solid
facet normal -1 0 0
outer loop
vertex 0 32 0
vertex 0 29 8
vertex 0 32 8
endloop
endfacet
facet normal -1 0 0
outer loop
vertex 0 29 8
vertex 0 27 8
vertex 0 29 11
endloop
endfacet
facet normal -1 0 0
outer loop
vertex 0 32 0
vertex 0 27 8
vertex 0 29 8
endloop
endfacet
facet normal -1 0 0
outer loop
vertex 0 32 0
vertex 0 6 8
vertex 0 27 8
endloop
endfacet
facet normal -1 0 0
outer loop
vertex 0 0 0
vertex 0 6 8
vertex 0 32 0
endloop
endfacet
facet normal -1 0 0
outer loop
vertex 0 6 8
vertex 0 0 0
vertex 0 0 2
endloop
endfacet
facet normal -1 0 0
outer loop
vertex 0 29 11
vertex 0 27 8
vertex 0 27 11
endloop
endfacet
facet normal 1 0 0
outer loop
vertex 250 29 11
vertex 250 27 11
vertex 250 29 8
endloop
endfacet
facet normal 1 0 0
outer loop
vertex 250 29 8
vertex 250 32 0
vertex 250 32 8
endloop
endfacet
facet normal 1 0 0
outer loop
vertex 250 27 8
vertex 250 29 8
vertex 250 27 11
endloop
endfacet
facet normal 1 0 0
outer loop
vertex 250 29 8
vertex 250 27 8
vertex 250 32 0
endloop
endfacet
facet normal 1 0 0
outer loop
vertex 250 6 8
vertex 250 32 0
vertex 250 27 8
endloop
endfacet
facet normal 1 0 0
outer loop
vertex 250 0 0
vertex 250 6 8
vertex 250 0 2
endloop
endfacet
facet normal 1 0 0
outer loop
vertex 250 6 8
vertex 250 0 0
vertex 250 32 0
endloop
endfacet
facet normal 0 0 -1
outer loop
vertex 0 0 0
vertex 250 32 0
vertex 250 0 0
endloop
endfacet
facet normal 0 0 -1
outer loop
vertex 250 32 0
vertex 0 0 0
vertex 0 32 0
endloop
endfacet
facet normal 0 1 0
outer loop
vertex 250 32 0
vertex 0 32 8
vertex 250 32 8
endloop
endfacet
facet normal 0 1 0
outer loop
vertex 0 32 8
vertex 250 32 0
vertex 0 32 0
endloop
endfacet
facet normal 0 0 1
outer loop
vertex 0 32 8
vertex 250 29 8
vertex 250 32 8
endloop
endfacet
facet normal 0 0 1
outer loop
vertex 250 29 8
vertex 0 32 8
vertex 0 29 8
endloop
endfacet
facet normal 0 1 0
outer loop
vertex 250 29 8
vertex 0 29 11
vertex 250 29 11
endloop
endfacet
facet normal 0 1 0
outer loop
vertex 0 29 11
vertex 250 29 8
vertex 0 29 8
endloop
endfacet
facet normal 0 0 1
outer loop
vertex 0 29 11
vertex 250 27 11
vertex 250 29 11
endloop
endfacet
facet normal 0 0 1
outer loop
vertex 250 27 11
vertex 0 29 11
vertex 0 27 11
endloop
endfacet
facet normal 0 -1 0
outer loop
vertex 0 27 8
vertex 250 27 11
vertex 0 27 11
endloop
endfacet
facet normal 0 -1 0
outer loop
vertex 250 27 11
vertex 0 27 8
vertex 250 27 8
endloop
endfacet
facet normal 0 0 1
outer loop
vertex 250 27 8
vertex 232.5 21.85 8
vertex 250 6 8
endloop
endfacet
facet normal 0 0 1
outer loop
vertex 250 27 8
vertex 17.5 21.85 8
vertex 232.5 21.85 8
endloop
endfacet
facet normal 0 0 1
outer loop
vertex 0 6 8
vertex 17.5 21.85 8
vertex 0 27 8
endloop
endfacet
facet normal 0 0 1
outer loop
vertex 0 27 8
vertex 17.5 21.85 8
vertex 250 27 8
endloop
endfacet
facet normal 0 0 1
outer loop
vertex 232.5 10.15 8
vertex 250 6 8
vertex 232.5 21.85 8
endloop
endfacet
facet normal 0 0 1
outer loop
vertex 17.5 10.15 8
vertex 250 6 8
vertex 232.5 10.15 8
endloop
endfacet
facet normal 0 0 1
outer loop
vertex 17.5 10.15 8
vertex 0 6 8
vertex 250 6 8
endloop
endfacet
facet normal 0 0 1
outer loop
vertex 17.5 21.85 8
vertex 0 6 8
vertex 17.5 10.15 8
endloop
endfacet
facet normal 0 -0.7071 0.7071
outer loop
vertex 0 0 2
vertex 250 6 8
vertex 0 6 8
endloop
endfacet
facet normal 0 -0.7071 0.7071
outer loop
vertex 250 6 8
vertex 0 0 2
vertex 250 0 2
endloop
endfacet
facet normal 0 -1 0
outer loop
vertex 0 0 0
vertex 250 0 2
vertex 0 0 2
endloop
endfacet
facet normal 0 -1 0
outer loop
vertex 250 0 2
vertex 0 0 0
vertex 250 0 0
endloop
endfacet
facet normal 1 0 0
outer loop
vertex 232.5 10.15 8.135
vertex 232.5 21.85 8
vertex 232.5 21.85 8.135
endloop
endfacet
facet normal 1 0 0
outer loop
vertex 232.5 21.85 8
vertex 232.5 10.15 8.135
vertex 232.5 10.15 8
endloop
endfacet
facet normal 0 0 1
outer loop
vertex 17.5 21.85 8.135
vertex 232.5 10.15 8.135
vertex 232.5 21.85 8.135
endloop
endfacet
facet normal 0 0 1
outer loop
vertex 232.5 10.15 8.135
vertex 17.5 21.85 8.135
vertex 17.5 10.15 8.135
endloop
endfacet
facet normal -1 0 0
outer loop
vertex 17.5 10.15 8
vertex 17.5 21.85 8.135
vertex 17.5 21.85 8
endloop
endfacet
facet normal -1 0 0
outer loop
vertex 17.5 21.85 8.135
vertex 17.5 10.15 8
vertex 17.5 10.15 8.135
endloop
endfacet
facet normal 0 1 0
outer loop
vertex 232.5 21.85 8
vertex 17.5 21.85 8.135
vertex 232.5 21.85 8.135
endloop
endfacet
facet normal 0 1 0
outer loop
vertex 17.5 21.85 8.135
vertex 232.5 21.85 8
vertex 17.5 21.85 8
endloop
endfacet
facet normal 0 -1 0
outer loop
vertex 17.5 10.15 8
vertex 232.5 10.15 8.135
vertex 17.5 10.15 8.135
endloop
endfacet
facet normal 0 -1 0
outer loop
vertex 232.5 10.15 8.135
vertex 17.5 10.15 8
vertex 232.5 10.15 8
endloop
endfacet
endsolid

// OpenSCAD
// em3D Modular menu rail v1.
// Print orientation: the visible front face is the flat plane at Z=0.
// The part extends upward in +Z, leaving the PEI build-plate texture on front.
// Back lower edge uses a 45-degree reinforced wedge for 3M tape mounting.

rail_length = 250;
rail_height = 32;
rail_depth = 8;
lip_depth = 3;
tape_back_width = 18;
border_thickness = 2;
text_string = "";
font_name = "Liberation Sans:style=Bold";

rear_chamfer = min(tape_back_width, rail_depth - border_thickness);
label_depth = 0.35;
label_size = min(rail_height * 0.22, 7);

$fn = 24;

// Cross-section points are [Y, Z]. The rail is extruded along X.
// The segment from [0, rail_depth - rear_chamfer] to
// [rear_chamfer, rail_depth] is the support-free 45-degree rear bridge.
profile_points = [
  [0, 0],
  [rail_height, 0],
  [rail_height, rail_depth],
  [rail_height - lip_depth, rail_depth],
  [rail_height - lip_depth, rail_depth + lip_depth],
  [rail_height - lip_depth - border_thickness, rail_depth + lip_depth],
  [rail_height - lip_depth - border_thickness, rail_depth],
  [rear_chamfer, rail_depth],
  [0, rail_depth - rear_chamfer]
];

module extruded_profile(points, length) {
  point_count = len(points);
  vertices = concat(
    [for (p = points) [0, p[0], p[1]]],
    [for (p = points) [length, p[0], p[1]]]
  );
  faces = concat(
    [[for (i = [point_count - 1 : -1 : 0]) i]],
    [[for (i = [0 : point_count - 1]) i + point_count]],
    [for (i = [0 : point_count - 1])
      [i, (i + 1) % point_count, ((i + 1) % point_count) + point_count, i + point_count]
    ]
  );

  polyhedron(points = vertices, faces = faces, convexity = 4);
}

module rear_tape_reference() {
  // A shallow, non-functional embossed guide on the back face showing where
  // the 3M tape should sit. It does not disturb the front PEI face.
  translate([rail_length / 2, rail_height / 2, rail_depth + 0.01])
    cube([rail_length * 0.86, max(2, tape_back_width * 0.65), 0.25], center = true);
}

module back_label() {
  if (len(text_string) > 0) {
    translate([rail_length / 2, rail_height * 0.5, rail_depth + 0.3])
      linear_extrude(height = label_depth)
        text(
          text_string,
          size = label_size,
          halign = "center",
          valign = "center",
          font = font_name
        );
  }
}

union() {
  extruded_profile(profile_points, rail_length);
  rear_tape_reference();
  back_label();
}
